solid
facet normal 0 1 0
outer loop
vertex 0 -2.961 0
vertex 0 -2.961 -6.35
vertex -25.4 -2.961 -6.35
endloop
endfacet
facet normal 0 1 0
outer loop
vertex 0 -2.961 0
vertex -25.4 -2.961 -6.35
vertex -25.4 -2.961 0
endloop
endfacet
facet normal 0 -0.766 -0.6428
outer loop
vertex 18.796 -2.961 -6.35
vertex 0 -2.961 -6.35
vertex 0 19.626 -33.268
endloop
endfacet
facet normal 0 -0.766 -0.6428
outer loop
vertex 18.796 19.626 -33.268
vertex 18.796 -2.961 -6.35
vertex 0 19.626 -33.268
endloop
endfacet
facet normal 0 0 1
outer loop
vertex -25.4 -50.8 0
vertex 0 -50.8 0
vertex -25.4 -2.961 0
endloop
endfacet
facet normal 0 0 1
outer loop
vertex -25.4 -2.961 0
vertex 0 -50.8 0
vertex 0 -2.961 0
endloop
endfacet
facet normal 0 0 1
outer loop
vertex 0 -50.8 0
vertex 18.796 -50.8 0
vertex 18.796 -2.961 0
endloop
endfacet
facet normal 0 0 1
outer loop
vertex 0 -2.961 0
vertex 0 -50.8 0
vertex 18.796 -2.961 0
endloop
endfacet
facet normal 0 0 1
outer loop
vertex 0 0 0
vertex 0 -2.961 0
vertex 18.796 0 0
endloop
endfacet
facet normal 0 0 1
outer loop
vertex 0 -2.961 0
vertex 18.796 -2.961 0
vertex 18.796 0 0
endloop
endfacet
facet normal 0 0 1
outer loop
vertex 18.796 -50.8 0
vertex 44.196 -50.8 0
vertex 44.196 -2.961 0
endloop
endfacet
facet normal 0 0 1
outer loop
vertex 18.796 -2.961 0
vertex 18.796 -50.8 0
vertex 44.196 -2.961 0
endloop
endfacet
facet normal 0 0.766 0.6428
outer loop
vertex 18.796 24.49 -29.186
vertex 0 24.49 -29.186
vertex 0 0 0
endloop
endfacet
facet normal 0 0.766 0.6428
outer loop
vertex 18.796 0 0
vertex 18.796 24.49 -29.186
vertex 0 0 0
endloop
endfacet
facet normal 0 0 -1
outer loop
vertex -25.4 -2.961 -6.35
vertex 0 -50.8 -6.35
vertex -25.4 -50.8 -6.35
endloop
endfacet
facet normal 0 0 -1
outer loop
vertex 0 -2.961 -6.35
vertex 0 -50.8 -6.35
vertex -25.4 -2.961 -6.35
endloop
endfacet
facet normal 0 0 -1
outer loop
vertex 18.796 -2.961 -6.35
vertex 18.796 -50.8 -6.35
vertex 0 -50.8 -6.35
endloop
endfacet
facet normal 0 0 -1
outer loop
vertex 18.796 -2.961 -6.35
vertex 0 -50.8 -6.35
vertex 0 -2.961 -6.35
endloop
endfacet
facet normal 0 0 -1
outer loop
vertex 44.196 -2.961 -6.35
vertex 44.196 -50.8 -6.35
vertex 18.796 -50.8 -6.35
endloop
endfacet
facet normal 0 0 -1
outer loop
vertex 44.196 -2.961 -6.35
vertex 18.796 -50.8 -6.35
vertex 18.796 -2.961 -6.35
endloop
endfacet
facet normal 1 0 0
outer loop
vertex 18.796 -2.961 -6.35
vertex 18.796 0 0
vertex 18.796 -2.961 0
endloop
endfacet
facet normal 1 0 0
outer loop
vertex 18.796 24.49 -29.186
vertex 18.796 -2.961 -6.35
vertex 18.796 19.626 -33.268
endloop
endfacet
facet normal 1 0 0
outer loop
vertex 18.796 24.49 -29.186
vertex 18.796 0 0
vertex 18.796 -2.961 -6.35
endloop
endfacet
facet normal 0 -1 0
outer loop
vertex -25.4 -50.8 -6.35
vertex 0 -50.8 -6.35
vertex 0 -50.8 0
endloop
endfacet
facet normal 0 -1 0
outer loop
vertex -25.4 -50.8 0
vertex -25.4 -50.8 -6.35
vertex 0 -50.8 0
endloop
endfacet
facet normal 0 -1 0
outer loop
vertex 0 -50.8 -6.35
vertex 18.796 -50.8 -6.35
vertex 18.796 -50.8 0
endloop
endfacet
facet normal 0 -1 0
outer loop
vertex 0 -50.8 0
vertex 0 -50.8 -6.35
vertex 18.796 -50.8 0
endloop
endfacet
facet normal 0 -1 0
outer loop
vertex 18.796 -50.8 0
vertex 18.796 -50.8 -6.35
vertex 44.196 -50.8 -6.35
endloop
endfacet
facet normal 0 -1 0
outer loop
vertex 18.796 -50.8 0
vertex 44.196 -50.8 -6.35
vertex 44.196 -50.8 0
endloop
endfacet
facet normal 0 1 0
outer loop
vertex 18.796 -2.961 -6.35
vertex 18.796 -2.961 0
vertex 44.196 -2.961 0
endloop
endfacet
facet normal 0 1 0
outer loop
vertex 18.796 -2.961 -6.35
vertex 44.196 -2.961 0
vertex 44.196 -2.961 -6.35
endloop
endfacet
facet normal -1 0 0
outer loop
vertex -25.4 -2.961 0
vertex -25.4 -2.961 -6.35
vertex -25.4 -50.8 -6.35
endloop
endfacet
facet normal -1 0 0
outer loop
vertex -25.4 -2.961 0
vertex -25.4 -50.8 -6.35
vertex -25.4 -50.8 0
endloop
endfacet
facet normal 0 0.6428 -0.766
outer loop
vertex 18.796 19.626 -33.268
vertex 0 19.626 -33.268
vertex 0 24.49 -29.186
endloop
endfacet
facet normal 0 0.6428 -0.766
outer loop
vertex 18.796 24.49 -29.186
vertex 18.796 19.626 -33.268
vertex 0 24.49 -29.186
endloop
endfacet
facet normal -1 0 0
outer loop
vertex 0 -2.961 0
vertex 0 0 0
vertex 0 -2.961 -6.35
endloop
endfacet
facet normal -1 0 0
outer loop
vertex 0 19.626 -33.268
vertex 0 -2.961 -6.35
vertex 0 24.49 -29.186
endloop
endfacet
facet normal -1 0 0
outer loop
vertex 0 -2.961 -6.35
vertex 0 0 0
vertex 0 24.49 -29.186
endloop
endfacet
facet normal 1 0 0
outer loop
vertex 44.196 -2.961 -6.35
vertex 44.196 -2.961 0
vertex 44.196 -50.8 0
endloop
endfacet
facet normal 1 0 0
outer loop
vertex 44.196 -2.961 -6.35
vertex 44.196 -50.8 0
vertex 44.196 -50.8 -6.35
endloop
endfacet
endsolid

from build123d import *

# Parameters (mm, degrees)
BOSS_EXTRUDE1_DEPTH = 18.796
SKETCH2_W           = 6.35
SKETCH2_H           = 47.838946371
BOSS_EXTRUDE2_DEPTH = 25.4
SKETCH3_W           = 6.35
SKETCH3_H           = 47.838946371
BOSS_EXTRUDE3_DEPTH = 25.4


with BuildPart() as part:
    # Sketch1 → Boss-Extrude1 (new body)
    with BuildSketch(Plane(origin=(0, 0, 0), x_dir=(0, 0, -1), z_dir=(1, 0, 0))):
        Polygon((0, 0), (0, -50.8), (6.35, -50.8), (6.35, -2.961053629), (33.267994604, 19.625825715), (29.186293283, 24.490207929), align=None)
    extrude(amount=BOSS_EXTRUDE1_DEPTH)

    # Sketch2 → Boss-Extrude2 (add)
    with BuildSketch(Plane(origin=(18.796, 0, 0), x_dir=(0, 0, -1), z_dir=(1, 0, 0))):
        with Locations((3.175, -26.880526815)):
            Rectangle(SKETCH2_W, SKETCH2_H)
    extrude(amount=BOSS_EXTRUDE2_DEPTH)

    # Sketch3 → Boss-Extrude3 (add)
    with BuildSketch(Plane.ZY):
        with Locations((-3.175, -26.880526815)):
            Rectangle(SKETCH3_W, SKETCH3_H)
    extrude(amount=BOSS_EXTRUDE3_DEPTH)


solid = part.part
